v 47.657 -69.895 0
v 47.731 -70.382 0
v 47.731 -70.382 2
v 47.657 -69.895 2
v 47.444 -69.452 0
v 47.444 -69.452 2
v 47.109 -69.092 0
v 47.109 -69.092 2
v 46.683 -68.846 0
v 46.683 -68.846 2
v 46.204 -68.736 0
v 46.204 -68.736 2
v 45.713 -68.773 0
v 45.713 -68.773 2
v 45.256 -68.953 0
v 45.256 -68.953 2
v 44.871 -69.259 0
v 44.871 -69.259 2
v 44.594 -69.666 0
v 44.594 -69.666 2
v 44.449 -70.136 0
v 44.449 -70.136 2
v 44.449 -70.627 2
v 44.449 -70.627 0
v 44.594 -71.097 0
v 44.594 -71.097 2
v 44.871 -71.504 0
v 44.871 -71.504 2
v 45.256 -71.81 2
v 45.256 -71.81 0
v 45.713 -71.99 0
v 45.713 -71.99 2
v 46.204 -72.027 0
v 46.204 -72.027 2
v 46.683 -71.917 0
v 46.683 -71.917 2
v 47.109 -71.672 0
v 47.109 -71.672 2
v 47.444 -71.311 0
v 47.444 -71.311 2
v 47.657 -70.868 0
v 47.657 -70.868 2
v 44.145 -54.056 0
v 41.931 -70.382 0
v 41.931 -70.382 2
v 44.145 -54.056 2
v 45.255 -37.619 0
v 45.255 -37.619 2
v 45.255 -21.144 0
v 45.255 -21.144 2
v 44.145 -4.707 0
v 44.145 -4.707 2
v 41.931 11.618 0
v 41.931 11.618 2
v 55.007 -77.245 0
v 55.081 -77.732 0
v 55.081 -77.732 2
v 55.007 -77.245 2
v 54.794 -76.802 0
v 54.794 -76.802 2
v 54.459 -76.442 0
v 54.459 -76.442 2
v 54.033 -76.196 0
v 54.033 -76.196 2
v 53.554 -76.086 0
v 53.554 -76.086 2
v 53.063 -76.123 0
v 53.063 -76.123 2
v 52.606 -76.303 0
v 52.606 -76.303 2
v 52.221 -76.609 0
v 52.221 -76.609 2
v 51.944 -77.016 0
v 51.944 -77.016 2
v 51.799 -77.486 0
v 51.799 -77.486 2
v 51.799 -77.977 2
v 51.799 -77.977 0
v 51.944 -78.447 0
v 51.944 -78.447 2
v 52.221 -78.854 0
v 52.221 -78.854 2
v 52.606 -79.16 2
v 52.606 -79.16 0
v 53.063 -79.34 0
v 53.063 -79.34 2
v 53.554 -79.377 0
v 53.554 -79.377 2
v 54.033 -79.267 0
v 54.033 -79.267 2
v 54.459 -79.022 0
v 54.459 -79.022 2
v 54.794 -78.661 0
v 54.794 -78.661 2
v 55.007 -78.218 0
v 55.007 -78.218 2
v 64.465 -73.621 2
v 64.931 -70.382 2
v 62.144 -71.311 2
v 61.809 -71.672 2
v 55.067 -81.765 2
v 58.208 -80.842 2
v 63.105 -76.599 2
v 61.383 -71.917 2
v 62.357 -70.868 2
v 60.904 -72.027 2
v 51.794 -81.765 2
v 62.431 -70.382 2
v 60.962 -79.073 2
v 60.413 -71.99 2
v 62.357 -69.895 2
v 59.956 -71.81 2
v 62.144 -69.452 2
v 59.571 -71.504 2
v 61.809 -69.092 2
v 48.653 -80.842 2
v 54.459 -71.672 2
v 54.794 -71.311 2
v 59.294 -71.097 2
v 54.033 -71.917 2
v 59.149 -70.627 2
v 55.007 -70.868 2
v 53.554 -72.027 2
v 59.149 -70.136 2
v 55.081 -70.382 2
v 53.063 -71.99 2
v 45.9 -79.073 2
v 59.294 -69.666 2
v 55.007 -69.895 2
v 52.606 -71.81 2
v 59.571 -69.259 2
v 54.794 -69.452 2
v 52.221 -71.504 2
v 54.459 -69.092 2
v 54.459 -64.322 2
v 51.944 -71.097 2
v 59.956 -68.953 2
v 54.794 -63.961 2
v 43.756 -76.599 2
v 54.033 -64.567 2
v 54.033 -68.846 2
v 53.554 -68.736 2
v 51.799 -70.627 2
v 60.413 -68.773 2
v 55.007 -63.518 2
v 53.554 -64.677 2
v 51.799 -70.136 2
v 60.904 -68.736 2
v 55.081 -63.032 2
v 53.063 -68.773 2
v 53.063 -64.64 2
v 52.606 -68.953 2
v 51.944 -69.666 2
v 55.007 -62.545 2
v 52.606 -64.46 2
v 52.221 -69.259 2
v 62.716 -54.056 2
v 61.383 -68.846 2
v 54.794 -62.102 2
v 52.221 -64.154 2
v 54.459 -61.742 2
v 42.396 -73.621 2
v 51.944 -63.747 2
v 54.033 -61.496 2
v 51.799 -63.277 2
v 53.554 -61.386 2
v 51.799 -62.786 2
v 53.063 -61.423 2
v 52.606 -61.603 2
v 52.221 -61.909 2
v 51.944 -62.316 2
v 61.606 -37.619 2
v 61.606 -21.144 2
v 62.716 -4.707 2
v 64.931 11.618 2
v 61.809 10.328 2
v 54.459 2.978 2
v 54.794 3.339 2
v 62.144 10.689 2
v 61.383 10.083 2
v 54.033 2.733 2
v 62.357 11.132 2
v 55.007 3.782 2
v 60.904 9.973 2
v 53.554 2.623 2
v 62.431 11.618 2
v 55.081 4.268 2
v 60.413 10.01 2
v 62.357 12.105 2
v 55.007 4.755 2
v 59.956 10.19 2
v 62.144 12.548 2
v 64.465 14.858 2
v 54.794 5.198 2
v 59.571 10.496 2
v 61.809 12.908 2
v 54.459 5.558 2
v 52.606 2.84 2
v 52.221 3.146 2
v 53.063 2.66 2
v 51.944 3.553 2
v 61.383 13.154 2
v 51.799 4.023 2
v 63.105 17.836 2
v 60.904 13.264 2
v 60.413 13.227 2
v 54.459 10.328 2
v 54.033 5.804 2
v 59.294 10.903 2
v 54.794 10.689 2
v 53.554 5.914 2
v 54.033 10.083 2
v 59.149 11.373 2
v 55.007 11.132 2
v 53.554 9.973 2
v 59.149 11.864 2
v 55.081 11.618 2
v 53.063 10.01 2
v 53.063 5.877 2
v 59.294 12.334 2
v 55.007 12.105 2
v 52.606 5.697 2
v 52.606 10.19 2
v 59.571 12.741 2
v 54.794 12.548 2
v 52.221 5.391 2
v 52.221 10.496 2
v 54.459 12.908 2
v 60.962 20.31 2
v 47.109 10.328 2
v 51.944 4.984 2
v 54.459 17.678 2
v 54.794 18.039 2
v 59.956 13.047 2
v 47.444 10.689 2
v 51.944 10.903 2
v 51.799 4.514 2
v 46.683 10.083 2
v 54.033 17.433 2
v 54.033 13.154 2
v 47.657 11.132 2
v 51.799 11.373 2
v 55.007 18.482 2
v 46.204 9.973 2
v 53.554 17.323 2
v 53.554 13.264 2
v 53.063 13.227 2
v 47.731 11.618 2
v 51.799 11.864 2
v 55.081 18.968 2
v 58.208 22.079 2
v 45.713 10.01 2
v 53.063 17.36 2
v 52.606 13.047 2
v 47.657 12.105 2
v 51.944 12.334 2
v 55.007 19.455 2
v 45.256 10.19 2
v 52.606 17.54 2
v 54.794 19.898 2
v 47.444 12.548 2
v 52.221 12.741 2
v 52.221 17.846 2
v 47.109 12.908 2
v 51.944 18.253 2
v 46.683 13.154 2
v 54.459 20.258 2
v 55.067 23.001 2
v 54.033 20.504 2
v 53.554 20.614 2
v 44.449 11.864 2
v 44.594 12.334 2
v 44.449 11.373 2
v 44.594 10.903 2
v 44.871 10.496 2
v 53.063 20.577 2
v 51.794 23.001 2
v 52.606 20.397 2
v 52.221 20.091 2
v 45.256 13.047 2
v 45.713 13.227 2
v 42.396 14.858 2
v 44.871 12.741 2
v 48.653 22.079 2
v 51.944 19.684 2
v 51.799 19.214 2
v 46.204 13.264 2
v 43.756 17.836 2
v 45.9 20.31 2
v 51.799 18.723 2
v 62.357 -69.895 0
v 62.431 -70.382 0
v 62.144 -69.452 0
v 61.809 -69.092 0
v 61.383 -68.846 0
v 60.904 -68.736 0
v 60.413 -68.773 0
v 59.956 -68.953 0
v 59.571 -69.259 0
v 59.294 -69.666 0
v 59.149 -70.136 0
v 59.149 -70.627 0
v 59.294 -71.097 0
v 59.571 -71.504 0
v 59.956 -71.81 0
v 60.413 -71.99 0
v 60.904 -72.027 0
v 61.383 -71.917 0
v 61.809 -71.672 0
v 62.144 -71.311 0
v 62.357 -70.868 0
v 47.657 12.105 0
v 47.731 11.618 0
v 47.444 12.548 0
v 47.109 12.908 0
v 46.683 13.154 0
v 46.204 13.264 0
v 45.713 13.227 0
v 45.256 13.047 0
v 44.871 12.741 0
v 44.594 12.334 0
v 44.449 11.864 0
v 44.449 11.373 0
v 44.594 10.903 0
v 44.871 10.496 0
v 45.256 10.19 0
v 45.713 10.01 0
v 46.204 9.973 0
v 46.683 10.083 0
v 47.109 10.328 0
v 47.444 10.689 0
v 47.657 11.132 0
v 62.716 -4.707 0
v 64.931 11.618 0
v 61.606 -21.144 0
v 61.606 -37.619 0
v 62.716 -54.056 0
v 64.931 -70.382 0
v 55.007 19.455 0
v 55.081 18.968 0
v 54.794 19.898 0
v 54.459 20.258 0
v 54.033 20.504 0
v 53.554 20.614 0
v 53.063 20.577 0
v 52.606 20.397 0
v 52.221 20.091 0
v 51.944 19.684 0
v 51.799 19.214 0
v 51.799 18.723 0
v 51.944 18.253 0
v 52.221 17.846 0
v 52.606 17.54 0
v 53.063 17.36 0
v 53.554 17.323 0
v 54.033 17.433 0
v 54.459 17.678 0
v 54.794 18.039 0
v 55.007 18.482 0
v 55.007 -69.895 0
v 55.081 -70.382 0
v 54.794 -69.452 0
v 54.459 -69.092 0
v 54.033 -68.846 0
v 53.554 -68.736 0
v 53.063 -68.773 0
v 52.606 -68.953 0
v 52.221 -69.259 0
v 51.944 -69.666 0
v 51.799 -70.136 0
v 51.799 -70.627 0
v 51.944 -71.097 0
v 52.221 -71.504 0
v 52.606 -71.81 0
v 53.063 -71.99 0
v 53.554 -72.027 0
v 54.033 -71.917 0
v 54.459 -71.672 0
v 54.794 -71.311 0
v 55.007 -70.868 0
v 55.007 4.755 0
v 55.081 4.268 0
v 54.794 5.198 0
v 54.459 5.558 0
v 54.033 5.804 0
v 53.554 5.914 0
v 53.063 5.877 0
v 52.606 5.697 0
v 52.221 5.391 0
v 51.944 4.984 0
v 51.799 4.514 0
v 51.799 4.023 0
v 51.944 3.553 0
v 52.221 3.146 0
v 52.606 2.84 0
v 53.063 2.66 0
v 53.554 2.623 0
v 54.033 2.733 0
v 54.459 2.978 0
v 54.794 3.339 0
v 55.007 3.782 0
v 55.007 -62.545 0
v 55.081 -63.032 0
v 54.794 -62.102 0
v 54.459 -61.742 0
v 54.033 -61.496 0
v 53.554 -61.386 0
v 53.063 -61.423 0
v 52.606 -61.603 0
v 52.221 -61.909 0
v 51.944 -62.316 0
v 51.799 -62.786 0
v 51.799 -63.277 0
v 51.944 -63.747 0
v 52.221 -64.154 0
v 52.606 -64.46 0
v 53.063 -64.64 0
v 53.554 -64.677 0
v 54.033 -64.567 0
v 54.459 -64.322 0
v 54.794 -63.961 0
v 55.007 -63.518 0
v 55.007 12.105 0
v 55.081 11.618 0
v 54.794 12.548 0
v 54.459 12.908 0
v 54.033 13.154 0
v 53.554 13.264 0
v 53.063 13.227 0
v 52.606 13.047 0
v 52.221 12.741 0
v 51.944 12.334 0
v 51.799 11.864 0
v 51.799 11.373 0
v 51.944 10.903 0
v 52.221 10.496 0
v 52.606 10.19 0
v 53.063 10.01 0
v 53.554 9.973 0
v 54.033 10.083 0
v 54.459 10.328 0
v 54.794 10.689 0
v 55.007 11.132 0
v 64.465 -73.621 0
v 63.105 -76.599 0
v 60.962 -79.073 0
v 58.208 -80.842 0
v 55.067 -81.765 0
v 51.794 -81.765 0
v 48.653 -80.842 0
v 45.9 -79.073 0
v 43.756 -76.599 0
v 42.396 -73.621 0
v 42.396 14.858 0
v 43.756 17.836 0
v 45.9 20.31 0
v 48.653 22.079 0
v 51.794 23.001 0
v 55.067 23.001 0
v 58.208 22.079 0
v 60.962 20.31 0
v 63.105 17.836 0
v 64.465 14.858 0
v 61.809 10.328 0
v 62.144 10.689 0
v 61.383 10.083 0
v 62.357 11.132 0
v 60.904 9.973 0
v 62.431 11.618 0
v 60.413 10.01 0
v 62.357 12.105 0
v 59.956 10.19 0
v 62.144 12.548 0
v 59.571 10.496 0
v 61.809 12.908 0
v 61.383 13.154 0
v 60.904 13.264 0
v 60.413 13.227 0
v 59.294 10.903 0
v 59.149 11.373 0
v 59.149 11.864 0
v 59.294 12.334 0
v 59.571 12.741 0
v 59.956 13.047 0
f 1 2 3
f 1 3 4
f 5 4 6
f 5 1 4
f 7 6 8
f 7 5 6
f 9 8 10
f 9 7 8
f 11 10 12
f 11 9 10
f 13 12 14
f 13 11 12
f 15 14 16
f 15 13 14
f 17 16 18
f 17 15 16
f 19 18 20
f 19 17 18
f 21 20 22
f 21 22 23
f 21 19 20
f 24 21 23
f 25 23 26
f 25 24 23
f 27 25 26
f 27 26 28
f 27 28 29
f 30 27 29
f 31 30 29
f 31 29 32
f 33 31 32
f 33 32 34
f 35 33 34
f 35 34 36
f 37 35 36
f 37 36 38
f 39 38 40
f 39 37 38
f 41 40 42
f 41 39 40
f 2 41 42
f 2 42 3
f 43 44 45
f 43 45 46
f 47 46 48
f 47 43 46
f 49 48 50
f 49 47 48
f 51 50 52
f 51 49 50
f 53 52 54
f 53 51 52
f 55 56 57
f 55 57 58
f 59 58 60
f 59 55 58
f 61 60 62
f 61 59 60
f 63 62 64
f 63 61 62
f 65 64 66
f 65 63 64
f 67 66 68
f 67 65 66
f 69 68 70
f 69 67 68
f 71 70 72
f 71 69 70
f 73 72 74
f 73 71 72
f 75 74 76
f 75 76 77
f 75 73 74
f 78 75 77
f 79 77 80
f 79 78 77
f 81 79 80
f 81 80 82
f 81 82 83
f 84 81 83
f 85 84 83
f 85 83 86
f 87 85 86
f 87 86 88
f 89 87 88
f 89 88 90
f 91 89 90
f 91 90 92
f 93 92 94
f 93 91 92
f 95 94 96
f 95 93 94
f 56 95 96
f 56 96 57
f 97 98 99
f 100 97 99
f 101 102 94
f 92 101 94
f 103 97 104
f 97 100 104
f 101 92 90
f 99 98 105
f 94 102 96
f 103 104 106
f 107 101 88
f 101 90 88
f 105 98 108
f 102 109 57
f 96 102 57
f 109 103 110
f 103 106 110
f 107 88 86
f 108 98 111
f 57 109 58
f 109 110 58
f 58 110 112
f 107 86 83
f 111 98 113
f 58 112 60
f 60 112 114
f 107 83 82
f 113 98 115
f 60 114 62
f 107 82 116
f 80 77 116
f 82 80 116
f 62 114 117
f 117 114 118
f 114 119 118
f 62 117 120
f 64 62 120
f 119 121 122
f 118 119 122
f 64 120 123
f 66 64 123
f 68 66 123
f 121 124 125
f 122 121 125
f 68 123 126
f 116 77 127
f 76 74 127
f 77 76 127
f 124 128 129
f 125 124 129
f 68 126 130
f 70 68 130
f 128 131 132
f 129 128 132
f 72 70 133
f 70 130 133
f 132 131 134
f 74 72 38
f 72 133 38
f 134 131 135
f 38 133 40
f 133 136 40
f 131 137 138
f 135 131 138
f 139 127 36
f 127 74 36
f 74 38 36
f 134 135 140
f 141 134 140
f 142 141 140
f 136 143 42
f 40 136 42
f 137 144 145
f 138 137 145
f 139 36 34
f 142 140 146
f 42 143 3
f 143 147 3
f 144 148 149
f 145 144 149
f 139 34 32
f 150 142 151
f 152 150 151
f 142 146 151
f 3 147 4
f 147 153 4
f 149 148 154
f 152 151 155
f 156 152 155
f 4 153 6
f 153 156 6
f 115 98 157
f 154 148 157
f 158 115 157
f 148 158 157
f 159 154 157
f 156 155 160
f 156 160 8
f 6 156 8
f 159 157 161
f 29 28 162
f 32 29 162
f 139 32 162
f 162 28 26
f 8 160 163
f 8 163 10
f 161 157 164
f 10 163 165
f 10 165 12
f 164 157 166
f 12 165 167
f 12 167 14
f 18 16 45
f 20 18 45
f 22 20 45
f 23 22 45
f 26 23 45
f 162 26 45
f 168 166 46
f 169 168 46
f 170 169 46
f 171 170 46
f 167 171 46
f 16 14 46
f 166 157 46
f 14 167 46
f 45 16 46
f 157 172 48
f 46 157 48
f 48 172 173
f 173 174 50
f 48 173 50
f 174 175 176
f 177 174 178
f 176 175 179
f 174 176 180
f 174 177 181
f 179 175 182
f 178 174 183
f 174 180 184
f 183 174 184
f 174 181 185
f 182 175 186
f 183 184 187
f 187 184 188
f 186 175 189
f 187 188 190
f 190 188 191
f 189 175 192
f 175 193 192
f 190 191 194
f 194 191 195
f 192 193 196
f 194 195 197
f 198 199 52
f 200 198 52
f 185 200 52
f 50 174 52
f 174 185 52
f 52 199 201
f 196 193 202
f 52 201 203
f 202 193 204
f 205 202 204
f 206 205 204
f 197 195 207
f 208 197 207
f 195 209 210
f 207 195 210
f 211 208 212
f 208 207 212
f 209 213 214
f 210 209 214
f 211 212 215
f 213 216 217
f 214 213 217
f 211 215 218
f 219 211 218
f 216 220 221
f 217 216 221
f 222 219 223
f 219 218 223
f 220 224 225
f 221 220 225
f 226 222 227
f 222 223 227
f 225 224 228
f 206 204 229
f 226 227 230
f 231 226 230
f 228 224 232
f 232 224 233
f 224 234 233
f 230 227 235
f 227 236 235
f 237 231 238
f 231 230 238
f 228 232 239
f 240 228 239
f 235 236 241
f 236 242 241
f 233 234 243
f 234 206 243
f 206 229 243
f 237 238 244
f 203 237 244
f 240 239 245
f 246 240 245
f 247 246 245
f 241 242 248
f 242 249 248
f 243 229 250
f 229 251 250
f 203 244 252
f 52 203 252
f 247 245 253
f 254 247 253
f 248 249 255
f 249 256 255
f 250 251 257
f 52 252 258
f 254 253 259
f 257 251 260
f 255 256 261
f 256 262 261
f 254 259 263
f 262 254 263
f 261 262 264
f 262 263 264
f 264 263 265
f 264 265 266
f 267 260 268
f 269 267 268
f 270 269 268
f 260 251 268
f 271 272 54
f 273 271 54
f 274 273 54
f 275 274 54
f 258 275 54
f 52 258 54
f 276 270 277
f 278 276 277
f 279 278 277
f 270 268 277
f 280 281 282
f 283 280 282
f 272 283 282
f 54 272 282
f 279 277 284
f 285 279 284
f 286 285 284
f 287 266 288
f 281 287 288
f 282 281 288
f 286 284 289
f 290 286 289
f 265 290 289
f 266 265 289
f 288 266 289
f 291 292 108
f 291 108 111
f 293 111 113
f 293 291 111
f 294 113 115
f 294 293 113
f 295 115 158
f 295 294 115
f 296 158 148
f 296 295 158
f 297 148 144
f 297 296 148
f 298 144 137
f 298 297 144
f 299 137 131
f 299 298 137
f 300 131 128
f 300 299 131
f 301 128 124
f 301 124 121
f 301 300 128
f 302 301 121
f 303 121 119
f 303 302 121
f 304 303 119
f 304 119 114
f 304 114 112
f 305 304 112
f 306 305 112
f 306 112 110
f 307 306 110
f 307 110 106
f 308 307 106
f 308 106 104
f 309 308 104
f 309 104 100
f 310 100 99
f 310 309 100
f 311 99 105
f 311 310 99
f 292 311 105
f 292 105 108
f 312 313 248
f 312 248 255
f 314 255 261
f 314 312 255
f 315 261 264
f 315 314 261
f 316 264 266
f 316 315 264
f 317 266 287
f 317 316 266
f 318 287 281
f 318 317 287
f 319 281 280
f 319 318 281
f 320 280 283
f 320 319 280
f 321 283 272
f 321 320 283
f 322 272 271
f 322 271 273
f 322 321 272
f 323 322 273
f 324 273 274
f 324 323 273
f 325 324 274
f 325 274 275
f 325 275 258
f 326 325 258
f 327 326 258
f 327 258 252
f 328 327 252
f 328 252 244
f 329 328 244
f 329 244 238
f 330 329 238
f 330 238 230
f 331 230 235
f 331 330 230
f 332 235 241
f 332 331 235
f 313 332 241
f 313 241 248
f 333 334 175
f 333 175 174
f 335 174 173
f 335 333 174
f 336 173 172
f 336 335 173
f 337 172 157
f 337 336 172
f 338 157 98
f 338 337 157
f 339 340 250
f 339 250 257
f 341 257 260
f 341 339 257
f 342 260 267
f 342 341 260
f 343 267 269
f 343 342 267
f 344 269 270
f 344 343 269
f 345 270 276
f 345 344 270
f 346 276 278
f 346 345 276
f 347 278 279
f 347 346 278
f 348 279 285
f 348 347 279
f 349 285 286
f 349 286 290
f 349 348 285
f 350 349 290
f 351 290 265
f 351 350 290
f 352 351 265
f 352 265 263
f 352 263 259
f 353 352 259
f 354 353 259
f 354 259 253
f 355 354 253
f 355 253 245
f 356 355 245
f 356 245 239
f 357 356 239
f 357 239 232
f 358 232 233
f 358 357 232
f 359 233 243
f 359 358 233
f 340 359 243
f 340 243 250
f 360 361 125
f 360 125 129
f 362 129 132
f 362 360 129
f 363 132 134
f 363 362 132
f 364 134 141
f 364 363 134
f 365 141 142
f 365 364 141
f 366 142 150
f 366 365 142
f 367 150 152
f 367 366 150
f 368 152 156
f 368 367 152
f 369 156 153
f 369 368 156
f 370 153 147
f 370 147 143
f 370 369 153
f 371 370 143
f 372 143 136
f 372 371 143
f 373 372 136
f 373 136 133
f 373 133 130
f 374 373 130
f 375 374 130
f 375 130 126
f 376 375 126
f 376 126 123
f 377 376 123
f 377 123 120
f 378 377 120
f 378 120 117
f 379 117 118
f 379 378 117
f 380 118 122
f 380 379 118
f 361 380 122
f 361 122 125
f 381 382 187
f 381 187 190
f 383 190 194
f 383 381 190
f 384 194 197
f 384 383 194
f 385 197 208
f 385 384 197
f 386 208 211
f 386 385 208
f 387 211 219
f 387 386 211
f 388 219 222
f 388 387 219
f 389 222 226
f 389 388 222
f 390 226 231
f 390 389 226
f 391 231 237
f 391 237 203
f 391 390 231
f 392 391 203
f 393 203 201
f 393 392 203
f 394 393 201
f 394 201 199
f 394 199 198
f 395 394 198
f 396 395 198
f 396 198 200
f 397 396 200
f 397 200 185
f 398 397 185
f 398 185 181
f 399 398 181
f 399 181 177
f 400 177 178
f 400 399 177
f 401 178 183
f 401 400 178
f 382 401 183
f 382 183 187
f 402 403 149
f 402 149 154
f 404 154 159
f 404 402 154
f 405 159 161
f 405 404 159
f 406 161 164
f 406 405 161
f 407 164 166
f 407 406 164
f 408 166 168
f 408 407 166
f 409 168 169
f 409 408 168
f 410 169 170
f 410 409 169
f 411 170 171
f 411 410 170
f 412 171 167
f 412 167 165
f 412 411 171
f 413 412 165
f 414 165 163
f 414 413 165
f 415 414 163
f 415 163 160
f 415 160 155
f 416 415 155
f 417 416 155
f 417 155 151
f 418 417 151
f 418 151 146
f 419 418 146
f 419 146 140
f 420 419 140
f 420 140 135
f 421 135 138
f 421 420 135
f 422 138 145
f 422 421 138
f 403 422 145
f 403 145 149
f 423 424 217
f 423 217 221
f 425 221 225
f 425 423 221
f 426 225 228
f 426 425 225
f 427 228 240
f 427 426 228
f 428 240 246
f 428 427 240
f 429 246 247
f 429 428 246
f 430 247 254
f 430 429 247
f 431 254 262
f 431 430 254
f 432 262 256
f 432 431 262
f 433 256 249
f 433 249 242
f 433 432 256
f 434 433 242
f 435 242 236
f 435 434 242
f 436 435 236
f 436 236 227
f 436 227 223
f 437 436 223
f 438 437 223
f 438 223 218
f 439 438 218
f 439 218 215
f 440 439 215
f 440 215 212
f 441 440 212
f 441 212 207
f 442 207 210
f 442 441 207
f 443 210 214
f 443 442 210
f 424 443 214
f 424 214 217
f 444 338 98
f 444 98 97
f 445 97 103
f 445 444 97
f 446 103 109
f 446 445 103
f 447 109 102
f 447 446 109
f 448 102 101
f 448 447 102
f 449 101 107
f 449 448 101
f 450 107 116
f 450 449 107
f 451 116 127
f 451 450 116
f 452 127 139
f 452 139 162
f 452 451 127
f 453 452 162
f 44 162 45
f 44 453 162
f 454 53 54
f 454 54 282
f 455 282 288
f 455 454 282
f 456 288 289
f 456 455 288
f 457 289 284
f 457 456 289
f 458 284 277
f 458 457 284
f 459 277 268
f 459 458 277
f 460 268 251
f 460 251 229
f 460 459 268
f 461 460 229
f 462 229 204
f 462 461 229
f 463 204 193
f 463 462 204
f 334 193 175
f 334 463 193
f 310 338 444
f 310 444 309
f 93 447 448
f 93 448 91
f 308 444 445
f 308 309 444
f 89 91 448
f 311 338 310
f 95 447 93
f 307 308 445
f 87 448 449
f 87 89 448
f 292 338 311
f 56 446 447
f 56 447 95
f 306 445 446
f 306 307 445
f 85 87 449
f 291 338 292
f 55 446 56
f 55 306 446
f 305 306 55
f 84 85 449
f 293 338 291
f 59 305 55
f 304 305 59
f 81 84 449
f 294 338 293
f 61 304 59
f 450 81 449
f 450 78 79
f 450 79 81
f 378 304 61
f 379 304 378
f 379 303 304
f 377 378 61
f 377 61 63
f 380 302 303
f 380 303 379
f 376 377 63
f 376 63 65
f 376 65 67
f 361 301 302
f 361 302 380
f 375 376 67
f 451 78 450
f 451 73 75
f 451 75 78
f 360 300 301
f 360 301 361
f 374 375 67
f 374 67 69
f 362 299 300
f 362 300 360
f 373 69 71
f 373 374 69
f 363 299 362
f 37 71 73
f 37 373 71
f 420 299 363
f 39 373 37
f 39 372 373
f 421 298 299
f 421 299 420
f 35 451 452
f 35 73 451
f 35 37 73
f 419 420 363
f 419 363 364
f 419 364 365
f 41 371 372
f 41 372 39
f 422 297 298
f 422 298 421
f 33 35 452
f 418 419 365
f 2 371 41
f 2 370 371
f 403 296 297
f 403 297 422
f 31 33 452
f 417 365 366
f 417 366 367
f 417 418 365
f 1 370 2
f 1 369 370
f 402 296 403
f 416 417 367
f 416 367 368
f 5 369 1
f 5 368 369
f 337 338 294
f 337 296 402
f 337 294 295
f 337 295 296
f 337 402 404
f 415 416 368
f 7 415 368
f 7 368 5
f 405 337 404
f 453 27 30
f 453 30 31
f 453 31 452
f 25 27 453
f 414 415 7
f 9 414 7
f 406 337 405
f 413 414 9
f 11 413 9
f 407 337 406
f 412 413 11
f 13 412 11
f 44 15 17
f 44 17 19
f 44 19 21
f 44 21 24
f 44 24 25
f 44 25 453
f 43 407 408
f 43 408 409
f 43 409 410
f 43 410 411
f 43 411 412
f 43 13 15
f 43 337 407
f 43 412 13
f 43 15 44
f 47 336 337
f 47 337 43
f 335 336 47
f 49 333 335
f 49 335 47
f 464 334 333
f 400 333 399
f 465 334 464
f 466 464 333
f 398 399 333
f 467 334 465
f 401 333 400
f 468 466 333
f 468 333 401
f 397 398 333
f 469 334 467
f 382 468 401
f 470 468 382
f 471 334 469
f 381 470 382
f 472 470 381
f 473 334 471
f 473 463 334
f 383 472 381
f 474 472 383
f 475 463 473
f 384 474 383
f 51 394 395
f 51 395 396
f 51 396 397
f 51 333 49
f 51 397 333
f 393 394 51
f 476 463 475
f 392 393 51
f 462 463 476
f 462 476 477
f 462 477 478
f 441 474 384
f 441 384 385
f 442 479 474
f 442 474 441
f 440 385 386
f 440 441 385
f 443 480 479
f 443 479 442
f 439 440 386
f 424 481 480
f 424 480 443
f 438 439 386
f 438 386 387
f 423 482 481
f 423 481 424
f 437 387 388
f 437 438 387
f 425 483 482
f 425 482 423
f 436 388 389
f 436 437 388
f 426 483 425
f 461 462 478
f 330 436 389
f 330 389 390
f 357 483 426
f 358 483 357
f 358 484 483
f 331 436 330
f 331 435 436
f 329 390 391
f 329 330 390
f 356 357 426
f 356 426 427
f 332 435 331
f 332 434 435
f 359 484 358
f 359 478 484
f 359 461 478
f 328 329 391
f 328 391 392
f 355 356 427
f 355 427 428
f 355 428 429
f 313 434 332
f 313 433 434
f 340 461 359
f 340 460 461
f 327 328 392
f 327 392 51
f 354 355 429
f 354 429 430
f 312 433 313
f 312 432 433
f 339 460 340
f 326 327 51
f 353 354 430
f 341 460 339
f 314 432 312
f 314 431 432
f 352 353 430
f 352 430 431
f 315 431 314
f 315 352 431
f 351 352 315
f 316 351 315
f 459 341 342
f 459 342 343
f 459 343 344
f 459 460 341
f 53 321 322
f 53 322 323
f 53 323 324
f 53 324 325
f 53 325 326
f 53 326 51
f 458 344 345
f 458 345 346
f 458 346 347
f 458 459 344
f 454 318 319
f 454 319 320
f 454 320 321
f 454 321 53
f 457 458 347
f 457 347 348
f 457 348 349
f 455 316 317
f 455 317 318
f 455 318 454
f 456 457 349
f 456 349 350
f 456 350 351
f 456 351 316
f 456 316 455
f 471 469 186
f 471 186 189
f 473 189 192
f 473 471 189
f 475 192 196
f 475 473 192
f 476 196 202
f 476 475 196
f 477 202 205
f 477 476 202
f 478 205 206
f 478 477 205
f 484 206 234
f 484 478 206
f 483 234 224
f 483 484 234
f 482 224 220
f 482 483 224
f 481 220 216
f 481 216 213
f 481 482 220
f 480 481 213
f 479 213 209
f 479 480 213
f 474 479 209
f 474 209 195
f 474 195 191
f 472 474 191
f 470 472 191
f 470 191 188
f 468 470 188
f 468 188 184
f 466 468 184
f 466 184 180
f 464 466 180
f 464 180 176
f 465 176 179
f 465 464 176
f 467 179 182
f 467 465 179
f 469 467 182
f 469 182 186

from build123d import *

# Parameters (mm, degrees)
SKETCH_1_R      = 1.65
EXTRUDE_2_DEPTH = 2


with BuildPart() as part:
    # 草图1 → 凸台-拉伸2 (new body)
    with BuildSketch(Plane.XY):
        with BuildLine():
            ThreePointArc((64.930621202, 11.618442311), (61.467079618, -29.381557689), (64.930621202, -70.381557689))
            ThreePointArc((64.930621202, -70.381557689), (53.430621202, -81.881557689), (41.930621202, -70.381557689))
            ThreePointArc((41.930621202, -70.381557689), (45.394162787, -29.381557689), (41.930621202, 11.618442311))
            ThreePointArc((41.930621202, 11.618442311), (53.430621202, 23.118442311), (64.930621202, 11.618442311))
        make_face()
        with Locations((46.080621202, -70.381557689)):
            Circle(SKETCH_1_R, mode=Mode.SUBTRACT)
        with Locations((53.430621202, 4.268442311)):
            Circle(SKETCH_1_R, mode=Mode.SUBTRACT)
        with Locations((53.430621202, 11.618442311)):
            Circle(SKETCH_1_R, mode=Mode.SUBTRACT)
        with Locations((46.080621202, 11.618442311)):
            Circle(SKETCH_1_R, mode=Mode.SUBTRACT)
        with Locations((53.430621202, 18.968442311)):
            Circle(SKETCH_1_R, mode=Mode.SUBTRACT)
        with Locations((60.780621202, 11.618442311)):
            Circle(SKETCH_1_R, mode=Mode.SUBTRACT)
        with Locations((53.430621202, -70.381557689)):
            Circle(SKETCH_1_R, mode=Mode.SUBTRACT)
        with Locations((53.430621202, -63.031557689)):
            Circle(SKETCH_1_R, mode=Mode.SUBTRACT)
        with Locations((60.780621202, -70.381557689)):
            Circle(SKETCH_1_R, mode=Mode.SUBTRACT)
        with Locations((53.430621202, -77.731557689)):
            Circle(SKETCH_1_R, mode=Mode.SUBTRACT)
    extrude(amount=EXTRUDE_2_DEPTH)


solid = part.part
